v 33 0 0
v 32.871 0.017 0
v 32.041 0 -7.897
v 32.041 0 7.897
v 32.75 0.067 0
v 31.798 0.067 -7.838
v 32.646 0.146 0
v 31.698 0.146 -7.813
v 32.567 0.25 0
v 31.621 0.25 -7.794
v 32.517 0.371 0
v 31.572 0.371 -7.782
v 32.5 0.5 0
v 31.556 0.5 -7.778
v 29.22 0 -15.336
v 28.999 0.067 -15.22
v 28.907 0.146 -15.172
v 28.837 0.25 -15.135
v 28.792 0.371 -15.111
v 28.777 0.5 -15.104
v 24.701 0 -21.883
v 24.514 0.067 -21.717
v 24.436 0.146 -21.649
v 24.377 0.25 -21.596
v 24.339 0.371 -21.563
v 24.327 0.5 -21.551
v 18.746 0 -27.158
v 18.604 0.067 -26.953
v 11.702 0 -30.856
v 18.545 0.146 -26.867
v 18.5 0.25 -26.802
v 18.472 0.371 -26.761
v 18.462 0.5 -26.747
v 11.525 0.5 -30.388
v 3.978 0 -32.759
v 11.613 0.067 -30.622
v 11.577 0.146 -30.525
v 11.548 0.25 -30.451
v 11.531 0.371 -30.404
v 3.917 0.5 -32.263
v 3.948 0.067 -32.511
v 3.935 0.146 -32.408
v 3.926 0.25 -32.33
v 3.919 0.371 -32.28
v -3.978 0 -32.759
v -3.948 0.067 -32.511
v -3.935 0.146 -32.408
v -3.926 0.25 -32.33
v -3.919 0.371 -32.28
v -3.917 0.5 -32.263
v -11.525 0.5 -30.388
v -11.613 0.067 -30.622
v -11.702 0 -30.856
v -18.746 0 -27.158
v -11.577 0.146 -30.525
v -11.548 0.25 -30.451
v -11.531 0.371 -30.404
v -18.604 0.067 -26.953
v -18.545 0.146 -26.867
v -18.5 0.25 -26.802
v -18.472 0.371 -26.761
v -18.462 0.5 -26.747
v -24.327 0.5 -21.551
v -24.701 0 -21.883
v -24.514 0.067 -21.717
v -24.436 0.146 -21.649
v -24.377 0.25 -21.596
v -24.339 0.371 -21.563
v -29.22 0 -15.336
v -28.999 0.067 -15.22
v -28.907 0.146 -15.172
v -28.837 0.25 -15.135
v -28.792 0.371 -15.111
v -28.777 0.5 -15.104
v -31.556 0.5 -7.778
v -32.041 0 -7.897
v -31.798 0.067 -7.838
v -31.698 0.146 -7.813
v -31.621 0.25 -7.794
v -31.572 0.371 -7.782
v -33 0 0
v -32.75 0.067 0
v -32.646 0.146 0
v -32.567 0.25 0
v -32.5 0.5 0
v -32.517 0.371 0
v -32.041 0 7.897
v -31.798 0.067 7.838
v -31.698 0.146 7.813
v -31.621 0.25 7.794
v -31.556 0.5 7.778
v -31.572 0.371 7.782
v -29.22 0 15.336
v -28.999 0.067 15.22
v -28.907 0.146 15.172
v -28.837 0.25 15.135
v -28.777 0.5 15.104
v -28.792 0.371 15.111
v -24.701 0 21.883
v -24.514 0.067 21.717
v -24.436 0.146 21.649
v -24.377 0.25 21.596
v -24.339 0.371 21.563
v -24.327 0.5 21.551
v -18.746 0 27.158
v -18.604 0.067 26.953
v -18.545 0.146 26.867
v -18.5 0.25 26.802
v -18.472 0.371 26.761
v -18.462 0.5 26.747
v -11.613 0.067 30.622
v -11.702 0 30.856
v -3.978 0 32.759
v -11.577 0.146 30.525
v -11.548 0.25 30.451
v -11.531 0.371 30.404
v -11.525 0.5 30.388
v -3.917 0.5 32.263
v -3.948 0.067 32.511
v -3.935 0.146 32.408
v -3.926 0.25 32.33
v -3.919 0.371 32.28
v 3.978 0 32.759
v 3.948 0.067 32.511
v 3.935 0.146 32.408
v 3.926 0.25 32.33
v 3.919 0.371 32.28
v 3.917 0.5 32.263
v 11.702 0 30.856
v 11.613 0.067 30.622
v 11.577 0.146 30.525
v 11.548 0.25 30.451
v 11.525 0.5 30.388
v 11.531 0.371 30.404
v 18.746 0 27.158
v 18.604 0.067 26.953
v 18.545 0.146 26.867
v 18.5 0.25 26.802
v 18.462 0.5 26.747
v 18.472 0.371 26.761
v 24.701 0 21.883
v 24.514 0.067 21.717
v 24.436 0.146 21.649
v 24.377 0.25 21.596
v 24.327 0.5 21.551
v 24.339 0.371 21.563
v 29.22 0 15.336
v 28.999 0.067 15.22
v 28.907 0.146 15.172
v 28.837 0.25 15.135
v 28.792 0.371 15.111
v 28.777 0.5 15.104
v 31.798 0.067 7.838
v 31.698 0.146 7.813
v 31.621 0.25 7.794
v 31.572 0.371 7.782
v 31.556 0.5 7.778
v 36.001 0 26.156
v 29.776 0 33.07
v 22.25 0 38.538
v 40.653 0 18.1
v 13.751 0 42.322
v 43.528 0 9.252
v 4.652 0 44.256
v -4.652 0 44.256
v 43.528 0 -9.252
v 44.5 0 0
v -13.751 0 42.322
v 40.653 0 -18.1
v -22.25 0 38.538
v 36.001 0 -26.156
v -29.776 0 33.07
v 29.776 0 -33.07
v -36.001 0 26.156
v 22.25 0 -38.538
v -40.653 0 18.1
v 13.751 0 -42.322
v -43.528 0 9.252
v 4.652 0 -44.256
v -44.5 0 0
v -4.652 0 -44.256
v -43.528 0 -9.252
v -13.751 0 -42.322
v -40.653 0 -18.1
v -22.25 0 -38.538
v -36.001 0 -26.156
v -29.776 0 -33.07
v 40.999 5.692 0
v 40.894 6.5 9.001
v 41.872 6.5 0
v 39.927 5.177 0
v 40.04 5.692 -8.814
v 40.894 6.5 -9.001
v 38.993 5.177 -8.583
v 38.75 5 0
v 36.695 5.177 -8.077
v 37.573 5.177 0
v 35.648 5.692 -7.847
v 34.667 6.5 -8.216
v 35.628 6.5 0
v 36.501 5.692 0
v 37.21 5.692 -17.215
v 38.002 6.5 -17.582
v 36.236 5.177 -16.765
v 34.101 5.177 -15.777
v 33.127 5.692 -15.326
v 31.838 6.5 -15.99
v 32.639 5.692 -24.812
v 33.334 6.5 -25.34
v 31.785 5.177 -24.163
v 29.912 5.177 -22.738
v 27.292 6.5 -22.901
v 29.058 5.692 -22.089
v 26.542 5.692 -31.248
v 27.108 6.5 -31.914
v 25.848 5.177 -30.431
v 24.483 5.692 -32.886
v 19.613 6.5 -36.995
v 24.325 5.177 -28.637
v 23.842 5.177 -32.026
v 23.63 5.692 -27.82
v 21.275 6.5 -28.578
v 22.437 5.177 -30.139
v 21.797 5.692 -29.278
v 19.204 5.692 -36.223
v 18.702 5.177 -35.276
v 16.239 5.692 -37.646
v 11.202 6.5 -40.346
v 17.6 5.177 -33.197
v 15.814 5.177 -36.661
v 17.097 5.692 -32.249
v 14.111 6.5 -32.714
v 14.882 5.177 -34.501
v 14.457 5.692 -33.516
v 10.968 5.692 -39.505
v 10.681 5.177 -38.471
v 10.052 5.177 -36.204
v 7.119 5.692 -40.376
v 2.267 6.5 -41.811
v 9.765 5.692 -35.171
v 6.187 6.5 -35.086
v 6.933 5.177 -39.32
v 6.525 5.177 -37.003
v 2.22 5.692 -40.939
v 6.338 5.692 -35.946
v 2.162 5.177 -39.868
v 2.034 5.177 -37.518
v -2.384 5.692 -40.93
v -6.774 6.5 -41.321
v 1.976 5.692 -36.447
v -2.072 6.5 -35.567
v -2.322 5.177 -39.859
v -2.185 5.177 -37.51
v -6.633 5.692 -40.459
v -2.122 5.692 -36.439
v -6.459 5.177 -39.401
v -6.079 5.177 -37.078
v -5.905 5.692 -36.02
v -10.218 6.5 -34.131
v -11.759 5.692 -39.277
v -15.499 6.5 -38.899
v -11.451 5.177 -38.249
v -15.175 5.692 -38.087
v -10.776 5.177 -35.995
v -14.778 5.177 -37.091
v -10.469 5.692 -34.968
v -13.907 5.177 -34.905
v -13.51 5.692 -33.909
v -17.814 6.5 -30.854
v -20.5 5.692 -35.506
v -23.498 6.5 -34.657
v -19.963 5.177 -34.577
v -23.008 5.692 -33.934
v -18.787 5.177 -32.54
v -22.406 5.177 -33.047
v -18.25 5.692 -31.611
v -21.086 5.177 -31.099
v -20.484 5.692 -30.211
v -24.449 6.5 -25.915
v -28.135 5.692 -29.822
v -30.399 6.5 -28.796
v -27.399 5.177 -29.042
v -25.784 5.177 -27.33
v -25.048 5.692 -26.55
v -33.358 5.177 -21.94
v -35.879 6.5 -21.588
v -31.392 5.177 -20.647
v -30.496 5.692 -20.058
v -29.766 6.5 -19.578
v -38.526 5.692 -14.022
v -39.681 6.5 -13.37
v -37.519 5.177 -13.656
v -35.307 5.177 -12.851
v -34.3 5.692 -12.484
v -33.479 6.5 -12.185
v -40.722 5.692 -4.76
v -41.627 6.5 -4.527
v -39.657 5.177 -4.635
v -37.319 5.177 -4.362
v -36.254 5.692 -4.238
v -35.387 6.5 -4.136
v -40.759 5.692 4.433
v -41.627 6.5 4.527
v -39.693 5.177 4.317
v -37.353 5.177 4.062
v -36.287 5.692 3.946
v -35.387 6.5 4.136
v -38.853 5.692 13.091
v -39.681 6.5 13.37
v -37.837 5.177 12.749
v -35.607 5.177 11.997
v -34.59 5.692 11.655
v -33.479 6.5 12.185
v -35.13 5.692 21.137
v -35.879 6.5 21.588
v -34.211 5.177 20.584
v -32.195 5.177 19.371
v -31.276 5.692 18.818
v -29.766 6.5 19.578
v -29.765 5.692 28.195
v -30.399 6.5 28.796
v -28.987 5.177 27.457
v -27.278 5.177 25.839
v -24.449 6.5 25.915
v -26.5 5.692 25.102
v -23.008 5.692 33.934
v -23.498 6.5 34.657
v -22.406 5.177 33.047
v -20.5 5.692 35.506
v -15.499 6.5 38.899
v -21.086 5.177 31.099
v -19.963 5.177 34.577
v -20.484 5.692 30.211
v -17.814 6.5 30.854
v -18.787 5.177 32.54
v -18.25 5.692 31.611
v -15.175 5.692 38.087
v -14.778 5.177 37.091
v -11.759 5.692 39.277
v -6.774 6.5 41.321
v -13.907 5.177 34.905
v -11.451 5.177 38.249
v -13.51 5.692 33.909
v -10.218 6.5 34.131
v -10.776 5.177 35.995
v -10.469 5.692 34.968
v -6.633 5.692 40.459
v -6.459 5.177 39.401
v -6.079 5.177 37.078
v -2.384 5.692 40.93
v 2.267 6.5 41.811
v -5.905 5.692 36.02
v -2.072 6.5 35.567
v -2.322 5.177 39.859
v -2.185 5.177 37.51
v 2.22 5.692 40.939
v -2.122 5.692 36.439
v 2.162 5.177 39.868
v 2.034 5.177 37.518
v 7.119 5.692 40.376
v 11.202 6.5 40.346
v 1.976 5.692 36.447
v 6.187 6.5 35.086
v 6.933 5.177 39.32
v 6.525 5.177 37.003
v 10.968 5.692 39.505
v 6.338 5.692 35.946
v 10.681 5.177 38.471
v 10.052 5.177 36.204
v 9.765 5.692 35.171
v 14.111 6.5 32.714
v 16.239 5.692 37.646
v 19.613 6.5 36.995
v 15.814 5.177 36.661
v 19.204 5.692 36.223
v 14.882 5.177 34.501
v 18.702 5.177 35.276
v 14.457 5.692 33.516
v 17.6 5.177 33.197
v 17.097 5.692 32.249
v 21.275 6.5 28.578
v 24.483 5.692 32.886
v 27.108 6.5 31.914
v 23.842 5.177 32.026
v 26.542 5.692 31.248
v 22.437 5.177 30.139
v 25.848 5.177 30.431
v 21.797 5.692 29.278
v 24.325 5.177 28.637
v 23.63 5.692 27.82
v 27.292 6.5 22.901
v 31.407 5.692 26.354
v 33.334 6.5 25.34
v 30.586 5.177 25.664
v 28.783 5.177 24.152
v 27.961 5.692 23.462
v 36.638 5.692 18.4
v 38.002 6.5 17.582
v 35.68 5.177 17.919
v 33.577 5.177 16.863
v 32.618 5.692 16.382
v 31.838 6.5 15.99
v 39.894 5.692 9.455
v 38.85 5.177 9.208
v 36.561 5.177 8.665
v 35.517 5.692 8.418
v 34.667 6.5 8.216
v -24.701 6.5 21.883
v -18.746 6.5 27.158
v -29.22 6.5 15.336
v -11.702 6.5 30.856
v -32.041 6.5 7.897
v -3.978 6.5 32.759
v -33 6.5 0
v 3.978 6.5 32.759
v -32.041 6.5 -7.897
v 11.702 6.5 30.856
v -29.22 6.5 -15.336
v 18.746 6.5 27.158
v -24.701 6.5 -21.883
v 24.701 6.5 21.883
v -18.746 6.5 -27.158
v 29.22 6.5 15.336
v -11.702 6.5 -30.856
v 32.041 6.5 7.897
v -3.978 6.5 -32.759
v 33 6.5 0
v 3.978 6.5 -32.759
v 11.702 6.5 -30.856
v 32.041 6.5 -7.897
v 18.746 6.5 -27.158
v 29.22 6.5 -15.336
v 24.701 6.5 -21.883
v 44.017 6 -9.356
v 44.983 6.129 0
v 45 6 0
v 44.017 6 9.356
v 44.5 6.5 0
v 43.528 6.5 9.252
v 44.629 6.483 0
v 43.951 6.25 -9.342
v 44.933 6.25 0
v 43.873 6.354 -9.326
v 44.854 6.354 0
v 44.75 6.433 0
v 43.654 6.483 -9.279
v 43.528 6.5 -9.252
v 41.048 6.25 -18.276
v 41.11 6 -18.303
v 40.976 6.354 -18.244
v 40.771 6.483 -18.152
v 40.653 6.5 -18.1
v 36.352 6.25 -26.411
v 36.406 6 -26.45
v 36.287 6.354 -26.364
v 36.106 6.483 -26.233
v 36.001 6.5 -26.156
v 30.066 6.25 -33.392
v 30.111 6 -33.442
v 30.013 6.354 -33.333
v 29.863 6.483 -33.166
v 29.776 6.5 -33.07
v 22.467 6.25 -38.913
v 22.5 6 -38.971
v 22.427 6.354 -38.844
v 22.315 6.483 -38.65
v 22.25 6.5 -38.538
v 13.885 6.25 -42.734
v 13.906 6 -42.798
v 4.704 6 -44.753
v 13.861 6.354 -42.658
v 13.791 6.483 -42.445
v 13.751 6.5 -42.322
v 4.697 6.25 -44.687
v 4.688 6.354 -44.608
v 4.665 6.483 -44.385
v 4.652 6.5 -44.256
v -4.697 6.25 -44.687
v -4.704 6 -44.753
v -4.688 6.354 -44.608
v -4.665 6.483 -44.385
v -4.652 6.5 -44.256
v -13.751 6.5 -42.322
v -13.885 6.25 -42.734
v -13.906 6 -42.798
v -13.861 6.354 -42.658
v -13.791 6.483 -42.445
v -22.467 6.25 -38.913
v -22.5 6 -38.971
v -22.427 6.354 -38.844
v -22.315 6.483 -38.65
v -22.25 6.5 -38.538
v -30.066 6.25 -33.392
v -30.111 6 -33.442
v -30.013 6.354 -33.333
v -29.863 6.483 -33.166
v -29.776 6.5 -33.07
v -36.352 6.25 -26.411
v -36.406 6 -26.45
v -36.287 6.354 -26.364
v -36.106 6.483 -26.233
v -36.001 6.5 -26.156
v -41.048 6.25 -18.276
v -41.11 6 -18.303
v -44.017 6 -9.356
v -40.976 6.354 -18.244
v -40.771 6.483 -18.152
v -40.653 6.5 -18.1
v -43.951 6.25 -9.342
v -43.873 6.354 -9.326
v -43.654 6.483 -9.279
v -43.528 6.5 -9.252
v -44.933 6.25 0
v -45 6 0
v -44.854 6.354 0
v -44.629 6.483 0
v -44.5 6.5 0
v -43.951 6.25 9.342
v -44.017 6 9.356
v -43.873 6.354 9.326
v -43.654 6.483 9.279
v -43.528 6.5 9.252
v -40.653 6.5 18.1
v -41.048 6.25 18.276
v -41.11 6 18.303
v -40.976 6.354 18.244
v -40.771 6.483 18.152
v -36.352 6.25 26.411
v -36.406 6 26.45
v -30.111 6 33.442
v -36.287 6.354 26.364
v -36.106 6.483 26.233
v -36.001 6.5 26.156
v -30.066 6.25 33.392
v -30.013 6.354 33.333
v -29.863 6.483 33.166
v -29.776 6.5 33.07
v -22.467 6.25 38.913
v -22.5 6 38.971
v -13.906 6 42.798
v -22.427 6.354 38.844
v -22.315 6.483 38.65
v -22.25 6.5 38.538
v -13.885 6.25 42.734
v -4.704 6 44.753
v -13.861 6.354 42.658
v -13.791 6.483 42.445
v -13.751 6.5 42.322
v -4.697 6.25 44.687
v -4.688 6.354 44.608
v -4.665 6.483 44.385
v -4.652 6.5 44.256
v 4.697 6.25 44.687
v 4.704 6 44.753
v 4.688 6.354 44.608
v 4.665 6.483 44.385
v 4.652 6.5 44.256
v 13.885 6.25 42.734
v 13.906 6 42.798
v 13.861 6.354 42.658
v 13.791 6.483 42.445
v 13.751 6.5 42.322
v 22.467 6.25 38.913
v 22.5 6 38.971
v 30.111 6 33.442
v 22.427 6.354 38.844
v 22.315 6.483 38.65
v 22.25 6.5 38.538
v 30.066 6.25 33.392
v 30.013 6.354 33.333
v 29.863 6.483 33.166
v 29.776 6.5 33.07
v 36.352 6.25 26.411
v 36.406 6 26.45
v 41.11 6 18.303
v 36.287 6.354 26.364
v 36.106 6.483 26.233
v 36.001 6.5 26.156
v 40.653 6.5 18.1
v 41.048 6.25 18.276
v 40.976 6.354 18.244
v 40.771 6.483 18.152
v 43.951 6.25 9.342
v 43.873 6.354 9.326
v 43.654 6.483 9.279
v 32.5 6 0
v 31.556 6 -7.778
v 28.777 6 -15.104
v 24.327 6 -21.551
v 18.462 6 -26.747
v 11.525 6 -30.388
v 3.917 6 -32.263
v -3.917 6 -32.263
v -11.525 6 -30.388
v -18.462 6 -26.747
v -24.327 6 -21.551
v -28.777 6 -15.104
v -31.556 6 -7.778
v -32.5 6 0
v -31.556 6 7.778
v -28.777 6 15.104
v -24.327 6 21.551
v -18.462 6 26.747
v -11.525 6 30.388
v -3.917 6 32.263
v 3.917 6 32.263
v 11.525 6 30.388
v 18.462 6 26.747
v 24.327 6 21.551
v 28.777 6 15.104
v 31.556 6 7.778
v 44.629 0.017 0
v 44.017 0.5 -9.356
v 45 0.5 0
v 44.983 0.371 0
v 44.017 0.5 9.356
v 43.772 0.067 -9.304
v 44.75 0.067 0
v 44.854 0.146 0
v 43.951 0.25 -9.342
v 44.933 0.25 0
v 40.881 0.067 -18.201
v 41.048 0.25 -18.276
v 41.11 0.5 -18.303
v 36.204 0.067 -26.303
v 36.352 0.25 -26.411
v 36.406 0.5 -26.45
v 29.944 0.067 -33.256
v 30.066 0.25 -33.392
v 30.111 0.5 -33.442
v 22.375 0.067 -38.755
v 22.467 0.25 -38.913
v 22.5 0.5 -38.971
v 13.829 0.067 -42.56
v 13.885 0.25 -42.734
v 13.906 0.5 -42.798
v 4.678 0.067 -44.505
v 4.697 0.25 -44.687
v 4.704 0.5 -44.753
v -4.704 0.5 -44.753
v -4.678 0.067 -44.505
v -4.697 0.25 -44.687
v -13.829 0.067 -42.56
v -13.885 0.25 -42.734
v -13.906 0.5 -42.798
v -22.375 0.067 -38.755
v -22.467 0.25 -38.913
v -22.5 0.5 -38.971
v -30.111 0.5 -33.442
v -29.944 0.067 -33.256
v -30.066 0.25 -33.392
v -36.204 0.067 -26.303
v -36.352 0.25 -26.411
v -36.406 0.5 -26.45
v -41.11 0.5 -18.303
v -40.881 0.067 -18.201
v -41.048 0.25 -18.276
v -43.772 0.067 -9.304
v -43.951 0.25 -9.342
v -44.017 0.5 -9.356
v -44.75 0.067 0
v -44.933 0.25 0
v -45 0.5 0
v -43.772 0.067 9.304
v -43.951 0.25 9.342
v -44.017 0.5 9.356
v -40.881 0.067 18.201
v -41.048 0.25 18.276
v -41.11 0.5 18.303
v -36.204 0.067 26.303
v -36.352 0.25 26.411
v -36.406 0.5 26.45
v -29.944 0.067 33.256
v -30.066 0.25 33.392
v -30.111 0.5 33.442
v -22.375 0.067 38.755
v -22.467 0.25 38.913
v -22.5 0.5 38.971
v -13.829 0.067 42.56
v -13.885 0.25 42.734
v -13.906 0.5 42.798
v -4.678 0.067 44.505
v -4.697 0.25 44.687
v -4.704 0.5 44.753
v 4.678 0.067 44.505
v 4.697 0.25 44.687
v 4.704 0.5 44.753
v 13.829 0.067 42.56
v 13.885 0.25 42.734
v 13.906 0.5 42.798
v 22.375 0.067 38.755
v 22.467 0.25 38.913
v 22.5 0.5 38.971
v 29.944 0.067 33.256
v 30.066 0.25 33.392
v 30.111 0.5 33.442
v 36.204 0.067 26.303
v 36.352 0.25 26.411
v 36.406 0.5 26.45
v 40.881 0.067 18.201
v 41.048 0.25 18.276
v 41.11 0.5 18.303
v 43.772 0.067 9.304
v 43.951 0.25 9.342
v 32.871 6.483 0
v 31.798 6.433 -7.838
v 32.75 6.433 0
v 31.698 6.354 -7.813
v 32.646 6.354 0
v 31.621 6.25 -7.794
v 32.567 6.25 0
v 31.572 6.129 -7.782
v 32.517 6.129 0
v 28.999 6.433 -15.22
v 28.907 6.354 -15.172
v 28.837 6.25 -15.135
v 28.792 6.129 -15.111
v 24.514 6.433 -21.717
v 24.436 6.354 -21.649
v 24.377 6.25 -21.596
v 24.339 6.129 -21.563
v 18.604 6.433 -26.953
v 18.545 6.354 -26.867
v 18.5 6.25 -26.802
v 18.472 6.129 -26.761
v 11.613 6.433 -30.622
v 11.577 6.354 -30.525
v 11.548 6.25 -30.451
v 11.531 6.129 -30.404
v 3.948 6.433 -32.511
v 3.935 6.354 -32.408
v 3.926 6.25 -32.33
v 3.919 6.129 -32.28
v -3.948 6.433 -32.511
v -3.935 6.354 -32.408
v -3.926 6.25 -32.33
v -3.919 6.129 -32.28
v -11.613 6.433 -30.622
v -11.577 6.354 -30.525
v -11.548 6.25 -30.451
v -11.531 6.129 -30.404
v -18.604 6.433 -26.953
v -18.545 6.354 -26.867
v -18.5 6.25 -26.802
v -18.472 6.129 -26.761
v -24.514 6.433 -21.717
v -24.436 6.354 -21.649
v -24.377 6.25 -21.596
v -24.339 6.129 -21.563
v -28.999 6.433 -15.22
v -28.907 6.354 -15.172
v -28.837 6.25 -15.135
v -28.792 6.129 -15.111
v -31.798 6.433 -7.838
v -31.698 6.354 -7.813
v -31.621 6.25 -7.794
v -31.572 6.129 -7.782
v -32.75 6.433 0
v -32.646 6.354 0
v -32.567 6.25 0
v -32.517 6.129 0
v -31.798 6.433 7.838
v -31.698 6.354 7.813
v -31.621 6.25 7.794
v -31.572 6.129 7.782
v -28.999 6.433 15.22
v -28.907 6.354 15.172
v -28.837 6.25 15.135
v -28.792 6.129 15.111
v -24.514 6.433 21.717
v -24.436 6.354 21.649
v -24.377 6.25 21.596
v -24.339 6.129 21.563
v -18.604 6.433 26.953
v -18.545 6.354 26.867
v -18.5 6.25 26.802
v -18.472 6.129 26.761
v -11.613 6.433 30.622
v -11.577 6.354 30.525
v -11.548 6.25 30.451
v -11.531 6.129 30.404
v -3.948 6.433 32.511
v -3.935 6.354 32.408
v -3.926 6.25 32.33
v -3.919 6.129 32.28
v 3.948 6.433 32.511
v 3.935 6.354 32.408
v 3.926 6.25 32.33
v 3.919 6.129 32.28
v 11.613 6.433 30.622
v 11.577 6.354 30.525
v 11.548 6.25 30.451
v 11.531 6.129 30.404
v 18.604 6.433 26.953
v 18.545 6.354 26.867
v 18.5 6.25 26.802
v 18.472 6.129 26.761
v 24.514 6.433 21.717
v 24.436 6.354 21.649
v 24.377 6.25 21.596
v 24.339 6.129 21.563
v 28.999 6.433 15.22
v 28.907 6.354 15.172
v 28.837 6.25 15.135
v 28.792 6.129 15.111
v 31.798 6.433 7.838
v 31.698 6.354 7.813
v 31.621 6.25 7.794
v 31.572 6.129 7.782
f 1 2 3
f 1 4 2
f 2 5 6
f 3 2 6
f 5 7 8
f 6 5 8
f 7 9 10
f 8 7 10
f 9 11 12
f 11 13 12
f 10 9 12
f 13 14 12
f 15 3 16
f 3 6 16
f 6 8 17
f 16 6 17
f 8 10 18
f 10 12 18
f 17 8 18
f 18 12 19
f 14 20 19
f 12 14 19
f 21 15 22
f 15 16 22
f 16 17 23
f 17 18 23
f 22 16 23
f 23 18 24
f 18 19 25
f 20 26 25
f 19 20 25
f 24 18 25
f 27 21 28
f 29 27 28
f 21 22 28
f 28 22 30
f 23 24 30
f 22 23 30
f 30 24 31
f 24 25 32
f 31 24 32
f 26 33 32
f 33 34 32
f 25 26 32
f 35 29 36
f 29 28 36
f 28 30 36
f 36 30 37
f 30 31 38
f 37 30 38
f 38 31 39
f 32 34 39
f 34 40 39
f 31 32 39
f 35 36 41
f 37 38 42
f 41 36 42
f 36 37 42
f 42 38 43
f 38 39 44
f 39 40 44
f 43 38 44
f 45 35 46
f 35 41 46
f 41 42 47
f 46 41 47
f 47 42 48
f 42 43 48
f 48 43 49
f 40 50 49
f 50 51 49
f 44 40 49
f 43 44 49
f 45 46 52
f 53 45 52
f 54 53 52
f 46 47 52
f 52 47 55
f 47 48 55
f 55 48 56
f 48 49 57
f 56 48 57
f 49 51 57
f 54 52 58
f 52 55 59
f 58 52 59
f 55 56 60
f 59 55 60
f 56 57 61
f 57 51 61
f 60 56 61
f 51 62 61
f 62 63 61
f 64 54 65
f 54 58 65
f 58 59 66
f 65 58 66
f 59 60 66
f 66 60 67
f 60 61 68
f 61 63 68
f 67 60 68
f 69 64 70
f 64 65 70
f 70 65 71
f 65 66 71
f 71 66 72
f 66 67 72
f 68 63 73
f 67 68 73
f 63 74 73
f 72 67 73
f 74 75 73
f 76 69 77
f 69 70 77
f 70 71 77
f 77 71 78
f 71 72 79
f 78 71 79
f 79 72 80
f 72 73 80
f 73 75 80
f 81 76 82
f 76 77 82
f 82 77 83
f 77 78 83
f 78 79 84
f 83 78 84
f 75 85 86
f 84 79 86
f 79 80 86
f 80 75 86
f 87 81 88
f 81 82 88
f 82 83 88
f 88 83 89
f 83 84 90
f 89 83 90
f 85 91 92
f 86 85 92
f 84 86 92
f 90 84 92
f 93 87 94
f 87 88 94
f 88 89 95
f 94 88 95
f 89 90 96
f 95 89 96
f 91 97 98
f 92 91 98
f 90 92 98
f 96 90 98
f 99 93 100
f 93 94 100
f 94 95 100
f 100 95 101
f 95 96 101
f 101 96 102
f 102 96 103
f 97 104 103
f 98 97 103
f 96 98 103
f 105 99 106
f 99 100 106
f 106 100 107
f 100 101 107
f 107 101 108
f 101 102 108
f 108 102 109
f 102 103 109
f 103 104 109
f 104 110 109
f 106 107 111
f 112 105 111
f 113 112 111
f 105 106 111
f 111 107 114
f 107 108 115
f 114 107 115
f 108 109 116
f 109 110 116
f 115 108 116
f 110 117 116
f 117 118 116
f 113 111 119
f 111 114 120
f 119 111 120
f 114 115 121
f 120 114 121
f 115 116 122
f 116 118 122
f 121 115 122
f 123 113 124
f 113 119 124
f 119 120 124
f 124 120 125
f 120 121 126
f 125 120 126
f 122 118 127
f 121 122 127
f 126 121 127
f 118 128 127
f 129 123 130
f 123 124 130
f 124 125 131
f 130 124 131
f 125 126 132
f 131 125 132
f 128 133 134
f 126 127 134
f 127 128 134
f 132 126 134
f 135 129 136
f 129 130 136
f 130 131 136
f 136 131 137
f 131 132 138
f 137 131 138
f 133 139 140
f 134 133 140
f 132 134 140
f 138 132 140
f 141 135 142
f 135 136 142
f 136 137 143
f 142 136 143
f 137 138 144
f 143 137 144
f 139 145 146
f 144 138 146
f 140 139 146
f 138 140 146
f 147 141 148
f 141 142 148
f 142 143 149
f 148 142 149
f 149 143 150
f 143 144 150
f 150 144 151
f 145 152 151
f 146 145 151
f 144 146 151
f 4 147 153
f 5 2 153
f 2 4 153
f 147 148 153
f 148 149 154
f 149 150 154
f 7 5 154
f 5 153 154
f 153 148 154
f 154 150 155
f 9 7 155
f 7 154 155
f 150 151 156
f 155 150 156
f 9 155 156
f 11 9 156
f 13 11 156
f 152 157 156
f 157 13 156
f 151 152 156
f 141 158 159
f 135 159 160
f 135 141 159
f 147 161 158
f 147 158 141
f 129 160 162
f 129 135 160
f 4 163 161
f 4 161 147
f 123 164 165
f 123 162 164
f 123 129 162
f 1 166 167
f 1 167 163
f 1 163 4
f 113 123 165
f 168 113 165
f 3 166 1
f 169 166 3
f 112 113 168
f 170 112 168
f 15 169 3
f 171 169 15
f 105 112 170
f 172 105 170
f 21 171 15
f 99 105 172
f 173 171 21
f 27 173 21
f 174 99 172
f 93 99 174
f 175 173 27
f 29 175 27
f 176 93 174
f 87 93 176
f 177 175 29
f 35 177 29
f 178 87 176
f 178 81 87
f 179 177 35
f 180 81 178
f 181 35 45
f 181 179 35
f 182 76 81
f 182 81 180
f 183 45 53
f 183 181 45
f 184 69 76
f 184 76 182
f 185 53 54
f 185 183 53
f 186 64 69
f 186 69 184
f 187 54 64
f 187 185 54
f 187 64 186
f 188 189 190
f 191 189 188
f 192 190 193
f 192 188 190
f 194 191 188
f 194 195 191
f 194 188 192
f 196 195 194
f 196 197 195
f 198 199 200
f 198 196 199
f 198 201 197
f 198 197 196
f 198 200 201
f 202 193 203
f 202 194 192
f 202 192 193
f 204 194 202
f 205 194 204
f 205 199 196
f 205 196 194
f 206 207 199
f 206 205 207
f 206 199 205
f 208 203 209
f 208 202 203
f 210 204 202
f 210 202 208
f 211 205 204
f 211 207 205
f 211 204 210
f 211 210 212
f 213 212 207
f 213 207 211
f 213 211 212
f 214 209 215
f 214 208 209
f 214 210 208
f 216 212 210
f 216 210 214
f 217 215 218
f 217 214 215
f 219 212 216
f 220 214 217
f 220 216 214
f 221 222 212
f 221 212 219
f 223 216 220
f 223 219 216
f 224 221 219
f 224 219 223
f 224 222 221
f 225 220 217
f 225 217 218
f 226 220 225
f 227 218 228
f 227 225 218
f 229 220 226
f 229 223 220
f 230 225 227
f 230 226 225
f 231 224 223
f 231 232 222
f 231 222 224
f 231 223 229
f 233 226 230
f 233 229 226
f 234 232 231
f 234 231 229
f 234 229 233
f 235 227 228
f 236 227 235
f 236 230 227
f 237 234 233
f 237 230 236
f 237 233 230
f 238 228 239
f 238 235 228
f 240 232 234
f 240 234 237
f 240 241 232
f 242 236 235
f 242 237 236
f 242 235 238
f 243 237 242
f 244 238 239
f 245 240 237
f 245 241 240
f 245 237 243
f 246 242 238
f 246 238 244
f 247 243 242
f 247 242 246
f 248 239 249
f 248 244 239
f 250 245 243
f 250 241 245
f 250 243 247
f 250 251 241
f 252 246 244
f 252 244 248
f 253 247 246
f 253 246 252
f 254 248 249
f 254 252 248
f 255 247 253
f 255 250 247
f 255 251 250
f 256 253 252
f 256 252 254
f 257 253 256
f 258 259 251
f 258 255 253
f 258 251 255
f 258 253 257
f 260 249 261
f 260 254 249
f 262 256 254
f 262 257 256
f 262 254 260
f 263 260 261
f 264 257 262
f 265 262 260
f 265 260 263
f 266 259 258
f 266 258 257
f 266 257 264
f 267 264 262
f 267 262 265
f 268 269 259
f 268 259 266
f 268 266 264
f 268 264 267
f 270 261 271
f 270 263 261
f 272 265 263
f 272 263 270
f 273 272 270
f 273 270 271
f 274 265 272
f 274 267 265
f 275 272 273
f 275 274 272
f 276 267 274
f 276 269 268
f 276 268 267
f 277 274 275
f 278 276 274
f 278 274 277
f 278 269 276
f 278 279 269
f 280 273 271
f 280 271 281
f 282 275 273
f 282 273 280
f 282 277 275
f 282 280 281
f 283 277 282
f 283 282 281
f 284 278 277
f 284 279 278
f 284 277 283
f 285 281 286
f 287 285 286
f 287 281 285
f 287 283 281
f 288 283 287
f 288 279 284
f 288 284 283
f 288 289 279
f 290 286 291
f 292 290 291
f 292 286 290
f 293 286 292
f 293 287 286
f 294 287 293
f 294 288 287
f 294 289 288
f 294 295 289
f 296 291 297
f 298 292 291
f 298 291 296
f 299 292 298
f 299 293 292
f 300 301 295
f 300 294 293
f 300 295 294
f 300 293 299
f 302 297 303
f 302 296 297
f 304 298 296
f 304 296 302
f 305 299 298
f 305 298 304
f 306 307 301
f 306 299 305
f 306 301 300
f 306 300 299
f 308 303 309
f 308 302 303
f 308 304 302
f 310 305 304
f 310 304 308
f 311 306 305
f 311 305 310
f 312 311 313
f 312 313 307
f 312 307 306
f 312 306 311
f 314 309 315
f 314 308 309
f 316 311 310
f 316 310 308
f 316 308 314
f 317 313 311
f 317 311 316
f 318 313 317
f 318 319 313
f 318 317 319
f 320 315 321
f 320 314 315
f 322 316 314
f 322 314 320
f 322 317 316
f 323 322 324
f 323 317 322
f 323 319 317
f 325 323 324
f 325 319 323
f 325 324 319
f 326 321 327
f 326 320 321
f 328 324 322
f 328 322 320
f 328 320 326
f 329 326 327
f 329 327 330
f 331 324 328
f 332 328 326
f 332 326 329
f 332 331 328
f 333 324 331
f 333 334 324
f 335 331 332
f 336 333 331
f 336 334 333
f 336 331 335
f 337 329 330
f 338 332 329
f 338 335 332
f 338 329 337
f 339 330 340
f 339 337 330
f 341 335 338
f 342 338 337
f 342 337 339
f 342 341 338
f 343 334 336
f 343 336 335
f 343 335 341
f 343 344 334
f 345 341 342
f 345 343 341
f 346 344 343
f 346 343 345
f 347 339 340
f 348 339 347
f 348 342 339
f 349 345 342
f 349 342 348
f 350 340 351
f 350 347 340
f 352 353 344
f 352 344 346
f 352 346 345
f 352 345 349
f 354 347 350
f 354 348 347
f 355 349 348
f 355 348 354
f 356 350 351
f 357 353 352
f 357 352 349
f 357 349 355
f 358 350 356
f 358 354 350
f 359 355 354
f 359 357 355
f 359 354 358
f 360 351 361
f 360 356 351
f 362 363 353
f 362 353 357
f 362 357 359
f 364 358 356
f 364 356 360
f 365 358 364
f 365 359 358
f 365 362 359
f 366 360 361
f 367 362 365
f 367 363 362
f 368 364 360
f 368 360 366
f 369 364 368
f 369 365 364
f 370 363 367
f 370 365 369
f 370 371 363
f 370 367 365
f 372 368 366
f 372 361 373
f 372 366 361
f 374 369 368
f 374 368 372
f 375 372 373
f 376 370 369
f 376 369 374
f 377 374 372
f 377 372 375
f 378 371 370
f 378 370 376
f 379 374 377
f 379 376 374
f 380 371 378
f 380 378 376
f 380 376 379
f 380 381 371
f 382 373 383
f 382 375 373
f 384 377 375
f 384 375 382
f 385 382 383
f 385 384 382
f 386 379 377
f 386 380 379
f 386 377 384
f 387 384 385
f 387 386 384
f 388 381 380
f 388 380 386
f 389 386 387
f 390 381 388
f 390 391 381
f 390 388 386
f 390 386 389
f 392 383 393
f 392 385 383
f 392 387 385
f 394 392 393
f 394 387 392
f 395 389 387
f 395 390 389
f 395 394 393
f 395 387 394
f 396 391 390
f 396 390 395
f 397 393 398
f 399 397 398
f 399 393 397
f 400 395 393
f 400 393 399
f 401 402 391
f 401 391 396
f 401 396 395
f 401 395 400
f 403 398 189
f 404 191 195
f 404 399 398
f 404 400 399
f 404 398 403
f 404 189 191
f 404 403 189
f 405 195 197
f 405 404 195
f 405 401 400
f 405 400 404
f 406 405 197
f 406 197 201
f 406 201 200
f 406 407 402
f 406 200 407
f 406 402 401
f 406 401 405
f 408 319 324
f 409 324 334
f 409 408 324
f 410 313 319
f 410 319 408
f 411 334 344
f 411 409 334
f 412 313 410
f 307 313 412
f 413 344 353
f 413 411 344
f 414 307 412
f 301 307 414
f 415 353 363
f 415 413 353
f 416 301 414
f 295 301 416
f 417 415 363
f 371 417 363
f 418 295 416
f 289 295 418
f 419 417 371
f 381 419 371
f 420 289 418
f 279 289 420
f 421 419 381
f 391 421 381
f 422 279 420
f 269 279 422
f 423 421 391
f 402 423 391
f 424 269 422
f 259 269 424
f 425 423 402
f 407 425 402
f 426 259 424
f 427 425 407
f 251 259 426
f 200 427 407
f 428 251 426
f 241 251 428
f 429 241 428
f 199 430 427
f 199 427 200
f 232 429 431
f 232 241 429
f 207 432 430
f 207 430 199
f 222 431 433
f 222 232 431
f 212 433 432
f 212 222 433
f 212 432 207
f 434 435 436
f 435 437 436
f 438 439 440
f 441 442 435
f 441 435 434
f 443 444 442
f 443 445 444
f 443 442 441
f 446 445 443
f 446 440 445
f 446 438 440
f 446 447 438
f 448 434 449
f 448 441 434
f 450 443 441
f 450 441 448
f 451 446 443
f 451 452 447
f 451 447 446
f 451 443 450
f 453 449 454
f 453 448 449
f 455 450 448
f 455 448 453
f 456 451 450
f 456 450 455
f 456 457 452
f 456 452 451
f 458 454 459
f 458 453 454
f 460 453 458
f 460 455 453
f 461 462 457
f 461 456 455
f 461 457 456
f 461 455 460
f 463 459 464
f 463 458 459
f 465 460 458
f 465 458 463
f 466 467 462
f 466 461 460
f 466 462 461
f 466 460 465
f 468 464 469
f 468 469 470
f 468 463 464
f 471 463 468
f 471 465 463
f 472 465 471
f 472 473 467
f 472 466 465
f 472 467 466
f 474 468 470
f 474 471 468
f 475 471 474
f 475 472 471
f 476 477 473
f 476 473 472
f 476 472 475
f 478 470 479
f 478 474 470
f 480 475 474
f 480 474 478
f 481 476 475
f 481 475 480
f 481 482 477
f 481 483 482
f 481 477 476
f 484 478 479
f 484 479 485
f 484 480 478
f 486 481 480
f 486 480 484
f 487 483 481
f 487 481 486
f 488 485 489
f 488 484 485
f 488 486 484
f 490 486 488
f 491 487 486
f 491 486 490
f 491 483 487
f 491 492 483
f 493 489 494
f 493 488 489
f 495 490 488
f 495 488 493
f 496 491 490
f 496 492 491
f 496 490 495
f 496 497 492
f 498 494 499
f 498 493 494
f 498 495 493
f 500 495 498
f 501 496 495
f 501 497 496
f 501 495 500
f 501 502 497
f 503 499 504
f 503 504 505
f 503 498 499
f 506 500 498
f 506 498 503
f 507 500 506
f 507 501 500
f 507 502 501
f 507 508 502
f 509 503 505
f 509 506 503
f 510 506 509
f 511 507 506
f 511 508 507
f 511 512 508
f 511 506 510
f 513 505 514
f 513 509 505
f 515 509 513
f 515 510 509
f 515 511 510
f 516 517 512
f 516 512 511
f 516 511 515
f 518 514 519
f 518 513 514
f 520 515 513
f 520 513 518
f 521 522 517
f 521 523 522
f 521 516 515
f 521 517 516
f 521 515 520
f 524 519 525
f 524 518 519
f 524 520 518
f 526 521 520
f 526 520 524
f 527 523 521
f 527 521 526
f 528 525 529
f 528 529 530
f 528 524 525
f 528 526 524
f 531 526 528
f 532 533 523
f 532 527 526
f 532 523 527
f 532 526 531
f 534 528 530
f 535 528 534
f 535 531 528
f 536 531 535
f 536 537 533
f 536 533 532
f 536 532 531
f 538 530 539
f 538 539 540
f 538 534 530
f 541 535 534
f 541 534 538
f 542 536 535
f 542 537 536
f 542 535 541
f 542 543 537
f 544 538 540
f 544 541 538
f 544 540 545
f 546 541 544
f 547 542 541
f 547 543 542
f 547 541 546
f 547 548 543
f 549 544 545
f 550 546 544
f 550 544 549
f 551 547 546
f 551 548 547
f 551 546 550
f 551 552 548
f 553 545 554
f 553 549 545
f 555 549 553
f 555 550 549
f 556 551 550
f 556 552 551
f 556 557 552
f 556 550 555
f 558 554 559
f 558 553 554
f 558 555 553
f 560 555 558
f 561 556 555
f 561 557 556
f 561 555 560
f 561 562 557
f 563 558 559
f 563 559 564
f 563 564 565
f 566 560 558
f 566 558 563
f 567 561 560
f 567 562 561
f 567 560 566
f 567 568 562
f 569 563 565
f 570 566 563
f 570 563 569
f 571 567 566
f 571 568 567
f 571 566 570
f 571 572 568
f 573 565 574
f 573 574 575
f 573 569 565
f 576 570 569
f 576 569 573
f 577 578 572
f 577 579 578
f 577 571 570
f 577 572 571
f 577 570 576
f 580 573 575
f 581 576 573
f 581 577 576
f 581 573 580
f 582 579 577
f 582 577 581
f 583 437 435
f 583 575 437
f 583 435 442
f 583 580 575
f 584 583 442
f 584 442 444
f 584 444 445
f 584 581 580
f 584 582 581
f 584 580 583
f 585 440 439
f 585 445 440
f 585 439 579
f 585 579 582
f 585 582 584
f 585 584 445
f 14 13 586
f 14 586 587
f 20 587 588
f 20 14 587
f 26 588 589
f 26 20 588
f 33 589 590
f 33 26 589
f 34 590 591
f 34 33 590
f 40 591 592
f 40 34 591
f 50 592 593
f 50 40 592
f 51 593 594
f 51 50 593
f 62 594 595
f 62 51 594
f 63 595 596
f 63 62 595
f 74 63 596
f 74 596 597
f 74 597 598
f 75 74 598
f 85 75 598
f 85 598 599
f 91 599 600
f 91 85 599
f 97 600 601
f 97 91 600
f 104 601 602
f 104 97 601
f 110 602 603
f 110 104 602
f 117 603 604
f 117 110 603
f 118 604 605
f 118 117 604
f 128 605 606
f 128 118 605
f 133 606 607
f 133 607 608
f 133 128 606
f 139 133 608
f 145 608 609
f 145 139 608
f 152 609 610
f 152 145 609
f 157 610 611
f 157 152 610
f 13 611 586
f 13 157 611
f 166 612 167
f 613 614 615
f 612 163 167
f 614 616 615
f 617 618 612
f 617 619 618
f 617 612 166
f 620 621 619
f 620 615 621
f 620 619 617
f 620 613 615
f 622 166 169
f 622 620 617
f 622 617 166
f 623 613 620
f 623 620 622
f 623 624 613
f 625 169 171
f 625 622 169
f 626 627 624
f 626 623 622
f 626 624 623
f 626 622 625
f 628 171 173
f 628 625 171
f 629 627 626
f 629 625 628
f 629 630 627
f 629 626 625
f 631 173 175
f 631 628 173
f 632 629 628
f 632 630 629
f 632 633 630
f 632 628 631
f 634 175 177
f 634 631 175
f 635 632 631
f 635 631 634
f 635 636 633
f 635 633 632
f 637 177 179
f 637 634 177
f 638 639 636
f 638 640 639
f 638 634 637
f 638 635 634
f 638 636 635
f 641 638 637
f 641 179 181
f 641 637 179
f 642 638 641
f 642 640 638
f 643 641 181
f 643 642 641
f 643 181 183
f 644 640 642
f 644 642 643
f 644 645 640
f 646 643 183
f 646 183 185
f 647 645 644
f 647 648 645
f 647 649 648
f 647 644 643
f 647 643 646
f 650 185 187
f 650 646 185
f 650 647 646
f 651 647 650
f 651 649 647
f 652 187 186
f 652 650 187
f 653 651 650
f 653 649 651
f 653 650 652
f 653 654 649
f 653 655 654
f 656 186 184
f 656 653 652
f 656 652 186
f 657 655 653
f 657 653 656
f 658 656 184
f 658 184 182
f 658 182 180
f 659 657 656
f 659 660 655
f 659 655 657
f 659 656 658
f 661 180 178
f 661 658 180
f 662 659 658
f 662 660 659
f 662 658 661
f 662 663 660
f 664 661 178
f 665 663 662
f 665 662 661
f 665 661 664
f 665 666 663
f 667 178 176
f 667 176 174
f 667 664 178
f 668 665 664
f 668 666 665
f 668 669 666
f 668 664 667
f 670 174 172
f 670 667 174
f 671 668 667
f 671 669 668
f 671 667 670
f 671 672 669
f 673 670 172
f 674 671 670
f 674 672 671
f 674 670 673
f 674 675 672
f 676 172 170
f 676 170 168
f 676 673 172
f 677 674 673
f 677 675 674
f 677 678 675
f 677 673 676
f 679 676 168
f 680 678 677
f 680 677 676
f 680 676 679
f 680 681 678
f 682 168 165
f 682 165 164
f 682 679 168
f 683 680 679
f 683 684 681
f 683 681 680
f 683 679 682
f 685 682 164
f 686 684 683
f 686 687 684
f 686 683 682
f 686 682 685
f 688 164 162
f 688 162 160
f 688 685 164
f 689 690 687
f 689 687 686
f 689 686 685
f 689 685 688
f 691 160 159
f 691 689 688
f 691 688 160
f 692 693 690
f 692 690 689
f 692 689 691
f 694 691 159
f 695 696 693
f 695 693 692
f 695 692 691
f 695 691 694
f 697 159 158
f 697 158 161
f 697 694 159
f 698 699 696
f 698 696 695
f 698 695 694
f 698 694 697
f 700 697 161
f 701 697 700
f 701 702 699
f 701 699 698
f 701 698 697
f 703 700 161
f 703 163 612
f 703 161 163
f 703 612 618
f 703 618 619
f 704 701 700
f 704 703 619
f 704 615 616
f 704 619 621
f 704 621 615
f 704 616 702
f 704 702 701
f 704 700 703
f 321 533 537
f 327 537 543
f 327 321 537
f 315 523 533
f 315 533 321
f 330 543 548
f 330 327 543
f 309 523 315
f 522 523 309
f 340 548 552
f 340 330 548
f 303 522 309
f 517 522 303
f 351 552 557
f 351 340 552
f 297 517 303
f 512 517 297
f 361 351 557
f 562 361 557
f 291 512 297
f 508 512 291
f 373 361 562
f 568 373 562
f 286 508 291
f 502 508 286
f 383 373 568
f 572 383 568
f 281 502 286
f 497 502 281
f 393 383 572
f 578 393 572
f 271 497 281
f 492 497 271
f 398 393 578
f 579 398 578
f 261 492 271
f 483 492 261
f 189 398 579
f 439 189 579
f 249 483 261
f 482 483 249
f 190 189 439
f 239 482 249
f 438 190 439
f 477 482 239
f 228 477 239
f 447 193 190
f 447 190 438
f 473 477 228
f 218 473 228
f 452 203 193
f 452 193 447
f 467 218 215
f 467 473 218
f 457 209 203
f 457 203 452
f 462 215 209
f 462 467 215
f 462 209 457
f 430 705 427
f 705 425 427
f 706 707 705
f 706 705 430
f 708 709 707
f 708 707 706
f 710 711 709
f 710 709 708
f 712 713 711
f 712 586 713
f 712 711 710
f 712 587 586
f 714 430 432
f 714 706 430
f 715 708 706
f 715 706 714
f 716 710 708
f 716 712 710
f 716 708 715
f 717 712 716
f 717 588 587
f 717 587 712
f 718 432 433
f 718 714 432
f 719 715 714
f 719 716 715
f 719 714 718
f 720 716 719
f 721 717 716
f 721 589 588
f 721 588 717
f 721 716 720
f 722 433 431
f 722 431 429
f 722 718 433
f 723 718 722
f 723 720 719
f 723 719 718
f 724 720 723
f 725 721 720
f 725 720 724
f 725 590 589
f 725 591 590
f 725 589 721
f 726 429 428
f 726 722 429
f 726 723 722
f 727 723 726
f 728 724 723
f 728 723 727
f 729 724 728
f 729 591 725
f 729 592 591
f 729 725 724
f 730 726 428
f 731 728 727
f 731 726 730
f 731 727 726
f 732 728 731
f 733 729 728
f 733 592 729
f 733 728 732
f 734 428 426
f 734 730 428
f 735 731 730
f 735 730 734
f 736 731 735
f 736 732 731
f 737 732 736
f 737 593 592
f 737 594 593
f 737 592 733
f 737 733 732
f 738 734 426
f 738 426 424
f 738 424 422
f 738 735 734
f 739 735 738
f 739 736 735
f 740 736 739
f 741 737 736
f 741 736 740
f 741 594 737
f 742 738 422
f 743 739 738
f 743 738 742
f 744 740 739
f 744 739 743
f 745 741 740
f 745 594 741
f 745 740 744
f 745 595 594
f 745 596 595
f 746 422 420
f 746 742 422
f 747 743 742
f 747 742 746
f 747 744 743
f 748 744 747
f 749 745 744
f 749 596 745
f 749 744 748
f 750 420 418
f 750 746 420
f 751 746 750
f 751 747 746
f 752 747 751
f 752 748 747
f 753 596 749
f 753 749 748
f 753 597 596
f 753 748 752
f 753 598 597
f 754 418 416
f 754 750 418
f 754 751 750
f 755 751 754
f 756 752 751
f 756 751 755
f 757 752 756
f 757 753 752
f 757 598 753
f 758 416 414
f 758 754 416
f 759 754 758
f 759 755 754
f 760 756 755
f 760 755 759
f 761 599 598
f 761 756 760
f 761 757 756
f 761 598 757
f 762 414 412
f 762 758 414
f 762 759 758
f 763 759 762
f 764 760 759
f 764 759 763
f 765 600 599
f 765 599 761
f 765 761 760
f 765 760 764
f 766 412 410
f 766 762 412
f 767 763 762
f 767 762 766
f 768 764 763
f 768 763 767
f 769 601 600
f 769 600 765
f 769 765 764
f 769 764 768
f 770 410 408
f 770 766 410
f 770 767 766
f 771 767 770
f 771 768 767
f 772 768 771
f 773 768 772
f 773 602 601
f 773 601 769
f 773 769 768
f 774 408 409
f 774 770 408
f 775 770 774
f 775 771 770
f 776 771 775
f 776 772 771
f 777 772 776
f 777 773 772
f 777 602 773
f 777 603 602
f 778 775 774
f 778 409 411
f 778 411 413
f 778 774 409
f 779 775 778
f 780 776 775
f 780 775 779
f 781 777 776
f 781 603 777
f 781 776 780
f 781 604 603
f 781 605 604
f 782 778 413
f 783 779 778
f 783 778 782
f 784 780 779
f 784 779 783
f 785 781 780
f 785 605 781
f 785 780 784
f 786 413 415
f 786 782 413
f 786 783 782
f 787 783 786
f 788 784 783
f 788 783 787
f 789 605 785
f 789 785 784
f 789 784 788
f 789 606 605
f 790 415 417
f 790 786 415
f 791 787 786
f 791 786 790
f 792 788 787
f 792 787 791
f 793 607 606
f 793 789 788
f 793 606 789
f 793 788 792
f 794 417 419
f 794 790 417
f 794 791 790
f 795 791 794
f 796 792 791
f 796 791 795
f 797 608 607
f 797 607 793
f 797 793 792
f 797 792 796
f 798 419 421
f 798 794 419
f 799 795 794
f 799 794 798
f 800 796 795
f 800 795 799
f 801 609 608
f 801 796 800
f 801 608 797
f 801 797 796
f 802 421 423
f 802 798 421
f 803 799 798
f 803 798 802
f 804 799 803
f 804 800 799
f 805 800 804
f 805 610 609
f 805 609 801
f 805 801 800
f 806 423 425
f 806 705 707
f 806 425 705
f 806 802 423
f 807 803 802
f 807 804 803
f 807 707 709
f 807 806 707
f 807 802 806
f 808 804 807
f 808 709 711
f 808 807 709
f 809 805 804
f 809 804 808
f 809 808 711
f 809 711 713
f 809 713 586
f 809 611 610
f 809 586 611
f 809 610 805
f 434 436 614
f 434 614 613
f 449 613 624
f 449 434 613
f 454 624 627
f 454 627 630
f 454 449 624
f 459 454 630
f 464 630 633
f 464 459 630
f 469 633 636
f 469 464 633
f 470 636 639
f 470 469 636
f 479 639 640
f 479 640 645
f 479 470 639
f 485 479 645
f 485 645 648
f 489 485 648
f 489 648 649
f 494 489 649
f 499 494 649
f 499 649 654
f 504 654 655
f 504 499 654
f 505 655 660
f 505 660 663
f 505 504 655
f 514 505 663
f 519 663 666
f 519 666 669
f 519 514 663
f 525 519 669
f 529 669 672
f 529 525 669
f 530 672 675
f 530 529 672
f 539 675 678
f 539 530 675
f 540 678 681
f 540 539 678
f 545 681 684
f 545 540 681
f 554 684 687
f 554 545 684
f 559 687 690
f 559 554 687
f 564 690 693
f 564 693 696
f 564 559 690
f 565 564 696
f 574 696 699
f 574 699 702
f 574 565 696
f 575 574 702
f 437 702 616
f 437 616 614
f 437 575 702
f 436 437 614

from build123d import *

# Parameters (mm, degrees)
FILLET1_R = 0.5


with BuildPart() as part:
    # Sketch1 → Revolve1 (revolve)
    with BuildSketch(Plane.XY):
        with BuildLine():
            Line((32.5, 0), (45, 0))
            Line((45, 0), (45, 6.5))
            Line((45, 6.5), (41.872498999, 6.5))
            ThreePointArc((41.872498999, 6.5), (38.75, 5), (35.627501001, 6.5))
            Line((35.627501001, 6.5), (32.5, 6.5))
            Line((32.5, 6.5), (32.5, 0))
        make_face()
    revolve(axis=Axis((0, 0, 0), (0, 1, 0)))

    # Fillet1
    fillet1_edges = [part.edges().sort_by_distance(p)[0] for p in [
        (-32.5, 6.5, 0),
        (-45, 6.5, 0),
        (-45, 0, 0),
        (-32.5, 0, 0),
    ]]
    fillet(fillet1_edges, radius=FILLET1_R)


solid = part.part
